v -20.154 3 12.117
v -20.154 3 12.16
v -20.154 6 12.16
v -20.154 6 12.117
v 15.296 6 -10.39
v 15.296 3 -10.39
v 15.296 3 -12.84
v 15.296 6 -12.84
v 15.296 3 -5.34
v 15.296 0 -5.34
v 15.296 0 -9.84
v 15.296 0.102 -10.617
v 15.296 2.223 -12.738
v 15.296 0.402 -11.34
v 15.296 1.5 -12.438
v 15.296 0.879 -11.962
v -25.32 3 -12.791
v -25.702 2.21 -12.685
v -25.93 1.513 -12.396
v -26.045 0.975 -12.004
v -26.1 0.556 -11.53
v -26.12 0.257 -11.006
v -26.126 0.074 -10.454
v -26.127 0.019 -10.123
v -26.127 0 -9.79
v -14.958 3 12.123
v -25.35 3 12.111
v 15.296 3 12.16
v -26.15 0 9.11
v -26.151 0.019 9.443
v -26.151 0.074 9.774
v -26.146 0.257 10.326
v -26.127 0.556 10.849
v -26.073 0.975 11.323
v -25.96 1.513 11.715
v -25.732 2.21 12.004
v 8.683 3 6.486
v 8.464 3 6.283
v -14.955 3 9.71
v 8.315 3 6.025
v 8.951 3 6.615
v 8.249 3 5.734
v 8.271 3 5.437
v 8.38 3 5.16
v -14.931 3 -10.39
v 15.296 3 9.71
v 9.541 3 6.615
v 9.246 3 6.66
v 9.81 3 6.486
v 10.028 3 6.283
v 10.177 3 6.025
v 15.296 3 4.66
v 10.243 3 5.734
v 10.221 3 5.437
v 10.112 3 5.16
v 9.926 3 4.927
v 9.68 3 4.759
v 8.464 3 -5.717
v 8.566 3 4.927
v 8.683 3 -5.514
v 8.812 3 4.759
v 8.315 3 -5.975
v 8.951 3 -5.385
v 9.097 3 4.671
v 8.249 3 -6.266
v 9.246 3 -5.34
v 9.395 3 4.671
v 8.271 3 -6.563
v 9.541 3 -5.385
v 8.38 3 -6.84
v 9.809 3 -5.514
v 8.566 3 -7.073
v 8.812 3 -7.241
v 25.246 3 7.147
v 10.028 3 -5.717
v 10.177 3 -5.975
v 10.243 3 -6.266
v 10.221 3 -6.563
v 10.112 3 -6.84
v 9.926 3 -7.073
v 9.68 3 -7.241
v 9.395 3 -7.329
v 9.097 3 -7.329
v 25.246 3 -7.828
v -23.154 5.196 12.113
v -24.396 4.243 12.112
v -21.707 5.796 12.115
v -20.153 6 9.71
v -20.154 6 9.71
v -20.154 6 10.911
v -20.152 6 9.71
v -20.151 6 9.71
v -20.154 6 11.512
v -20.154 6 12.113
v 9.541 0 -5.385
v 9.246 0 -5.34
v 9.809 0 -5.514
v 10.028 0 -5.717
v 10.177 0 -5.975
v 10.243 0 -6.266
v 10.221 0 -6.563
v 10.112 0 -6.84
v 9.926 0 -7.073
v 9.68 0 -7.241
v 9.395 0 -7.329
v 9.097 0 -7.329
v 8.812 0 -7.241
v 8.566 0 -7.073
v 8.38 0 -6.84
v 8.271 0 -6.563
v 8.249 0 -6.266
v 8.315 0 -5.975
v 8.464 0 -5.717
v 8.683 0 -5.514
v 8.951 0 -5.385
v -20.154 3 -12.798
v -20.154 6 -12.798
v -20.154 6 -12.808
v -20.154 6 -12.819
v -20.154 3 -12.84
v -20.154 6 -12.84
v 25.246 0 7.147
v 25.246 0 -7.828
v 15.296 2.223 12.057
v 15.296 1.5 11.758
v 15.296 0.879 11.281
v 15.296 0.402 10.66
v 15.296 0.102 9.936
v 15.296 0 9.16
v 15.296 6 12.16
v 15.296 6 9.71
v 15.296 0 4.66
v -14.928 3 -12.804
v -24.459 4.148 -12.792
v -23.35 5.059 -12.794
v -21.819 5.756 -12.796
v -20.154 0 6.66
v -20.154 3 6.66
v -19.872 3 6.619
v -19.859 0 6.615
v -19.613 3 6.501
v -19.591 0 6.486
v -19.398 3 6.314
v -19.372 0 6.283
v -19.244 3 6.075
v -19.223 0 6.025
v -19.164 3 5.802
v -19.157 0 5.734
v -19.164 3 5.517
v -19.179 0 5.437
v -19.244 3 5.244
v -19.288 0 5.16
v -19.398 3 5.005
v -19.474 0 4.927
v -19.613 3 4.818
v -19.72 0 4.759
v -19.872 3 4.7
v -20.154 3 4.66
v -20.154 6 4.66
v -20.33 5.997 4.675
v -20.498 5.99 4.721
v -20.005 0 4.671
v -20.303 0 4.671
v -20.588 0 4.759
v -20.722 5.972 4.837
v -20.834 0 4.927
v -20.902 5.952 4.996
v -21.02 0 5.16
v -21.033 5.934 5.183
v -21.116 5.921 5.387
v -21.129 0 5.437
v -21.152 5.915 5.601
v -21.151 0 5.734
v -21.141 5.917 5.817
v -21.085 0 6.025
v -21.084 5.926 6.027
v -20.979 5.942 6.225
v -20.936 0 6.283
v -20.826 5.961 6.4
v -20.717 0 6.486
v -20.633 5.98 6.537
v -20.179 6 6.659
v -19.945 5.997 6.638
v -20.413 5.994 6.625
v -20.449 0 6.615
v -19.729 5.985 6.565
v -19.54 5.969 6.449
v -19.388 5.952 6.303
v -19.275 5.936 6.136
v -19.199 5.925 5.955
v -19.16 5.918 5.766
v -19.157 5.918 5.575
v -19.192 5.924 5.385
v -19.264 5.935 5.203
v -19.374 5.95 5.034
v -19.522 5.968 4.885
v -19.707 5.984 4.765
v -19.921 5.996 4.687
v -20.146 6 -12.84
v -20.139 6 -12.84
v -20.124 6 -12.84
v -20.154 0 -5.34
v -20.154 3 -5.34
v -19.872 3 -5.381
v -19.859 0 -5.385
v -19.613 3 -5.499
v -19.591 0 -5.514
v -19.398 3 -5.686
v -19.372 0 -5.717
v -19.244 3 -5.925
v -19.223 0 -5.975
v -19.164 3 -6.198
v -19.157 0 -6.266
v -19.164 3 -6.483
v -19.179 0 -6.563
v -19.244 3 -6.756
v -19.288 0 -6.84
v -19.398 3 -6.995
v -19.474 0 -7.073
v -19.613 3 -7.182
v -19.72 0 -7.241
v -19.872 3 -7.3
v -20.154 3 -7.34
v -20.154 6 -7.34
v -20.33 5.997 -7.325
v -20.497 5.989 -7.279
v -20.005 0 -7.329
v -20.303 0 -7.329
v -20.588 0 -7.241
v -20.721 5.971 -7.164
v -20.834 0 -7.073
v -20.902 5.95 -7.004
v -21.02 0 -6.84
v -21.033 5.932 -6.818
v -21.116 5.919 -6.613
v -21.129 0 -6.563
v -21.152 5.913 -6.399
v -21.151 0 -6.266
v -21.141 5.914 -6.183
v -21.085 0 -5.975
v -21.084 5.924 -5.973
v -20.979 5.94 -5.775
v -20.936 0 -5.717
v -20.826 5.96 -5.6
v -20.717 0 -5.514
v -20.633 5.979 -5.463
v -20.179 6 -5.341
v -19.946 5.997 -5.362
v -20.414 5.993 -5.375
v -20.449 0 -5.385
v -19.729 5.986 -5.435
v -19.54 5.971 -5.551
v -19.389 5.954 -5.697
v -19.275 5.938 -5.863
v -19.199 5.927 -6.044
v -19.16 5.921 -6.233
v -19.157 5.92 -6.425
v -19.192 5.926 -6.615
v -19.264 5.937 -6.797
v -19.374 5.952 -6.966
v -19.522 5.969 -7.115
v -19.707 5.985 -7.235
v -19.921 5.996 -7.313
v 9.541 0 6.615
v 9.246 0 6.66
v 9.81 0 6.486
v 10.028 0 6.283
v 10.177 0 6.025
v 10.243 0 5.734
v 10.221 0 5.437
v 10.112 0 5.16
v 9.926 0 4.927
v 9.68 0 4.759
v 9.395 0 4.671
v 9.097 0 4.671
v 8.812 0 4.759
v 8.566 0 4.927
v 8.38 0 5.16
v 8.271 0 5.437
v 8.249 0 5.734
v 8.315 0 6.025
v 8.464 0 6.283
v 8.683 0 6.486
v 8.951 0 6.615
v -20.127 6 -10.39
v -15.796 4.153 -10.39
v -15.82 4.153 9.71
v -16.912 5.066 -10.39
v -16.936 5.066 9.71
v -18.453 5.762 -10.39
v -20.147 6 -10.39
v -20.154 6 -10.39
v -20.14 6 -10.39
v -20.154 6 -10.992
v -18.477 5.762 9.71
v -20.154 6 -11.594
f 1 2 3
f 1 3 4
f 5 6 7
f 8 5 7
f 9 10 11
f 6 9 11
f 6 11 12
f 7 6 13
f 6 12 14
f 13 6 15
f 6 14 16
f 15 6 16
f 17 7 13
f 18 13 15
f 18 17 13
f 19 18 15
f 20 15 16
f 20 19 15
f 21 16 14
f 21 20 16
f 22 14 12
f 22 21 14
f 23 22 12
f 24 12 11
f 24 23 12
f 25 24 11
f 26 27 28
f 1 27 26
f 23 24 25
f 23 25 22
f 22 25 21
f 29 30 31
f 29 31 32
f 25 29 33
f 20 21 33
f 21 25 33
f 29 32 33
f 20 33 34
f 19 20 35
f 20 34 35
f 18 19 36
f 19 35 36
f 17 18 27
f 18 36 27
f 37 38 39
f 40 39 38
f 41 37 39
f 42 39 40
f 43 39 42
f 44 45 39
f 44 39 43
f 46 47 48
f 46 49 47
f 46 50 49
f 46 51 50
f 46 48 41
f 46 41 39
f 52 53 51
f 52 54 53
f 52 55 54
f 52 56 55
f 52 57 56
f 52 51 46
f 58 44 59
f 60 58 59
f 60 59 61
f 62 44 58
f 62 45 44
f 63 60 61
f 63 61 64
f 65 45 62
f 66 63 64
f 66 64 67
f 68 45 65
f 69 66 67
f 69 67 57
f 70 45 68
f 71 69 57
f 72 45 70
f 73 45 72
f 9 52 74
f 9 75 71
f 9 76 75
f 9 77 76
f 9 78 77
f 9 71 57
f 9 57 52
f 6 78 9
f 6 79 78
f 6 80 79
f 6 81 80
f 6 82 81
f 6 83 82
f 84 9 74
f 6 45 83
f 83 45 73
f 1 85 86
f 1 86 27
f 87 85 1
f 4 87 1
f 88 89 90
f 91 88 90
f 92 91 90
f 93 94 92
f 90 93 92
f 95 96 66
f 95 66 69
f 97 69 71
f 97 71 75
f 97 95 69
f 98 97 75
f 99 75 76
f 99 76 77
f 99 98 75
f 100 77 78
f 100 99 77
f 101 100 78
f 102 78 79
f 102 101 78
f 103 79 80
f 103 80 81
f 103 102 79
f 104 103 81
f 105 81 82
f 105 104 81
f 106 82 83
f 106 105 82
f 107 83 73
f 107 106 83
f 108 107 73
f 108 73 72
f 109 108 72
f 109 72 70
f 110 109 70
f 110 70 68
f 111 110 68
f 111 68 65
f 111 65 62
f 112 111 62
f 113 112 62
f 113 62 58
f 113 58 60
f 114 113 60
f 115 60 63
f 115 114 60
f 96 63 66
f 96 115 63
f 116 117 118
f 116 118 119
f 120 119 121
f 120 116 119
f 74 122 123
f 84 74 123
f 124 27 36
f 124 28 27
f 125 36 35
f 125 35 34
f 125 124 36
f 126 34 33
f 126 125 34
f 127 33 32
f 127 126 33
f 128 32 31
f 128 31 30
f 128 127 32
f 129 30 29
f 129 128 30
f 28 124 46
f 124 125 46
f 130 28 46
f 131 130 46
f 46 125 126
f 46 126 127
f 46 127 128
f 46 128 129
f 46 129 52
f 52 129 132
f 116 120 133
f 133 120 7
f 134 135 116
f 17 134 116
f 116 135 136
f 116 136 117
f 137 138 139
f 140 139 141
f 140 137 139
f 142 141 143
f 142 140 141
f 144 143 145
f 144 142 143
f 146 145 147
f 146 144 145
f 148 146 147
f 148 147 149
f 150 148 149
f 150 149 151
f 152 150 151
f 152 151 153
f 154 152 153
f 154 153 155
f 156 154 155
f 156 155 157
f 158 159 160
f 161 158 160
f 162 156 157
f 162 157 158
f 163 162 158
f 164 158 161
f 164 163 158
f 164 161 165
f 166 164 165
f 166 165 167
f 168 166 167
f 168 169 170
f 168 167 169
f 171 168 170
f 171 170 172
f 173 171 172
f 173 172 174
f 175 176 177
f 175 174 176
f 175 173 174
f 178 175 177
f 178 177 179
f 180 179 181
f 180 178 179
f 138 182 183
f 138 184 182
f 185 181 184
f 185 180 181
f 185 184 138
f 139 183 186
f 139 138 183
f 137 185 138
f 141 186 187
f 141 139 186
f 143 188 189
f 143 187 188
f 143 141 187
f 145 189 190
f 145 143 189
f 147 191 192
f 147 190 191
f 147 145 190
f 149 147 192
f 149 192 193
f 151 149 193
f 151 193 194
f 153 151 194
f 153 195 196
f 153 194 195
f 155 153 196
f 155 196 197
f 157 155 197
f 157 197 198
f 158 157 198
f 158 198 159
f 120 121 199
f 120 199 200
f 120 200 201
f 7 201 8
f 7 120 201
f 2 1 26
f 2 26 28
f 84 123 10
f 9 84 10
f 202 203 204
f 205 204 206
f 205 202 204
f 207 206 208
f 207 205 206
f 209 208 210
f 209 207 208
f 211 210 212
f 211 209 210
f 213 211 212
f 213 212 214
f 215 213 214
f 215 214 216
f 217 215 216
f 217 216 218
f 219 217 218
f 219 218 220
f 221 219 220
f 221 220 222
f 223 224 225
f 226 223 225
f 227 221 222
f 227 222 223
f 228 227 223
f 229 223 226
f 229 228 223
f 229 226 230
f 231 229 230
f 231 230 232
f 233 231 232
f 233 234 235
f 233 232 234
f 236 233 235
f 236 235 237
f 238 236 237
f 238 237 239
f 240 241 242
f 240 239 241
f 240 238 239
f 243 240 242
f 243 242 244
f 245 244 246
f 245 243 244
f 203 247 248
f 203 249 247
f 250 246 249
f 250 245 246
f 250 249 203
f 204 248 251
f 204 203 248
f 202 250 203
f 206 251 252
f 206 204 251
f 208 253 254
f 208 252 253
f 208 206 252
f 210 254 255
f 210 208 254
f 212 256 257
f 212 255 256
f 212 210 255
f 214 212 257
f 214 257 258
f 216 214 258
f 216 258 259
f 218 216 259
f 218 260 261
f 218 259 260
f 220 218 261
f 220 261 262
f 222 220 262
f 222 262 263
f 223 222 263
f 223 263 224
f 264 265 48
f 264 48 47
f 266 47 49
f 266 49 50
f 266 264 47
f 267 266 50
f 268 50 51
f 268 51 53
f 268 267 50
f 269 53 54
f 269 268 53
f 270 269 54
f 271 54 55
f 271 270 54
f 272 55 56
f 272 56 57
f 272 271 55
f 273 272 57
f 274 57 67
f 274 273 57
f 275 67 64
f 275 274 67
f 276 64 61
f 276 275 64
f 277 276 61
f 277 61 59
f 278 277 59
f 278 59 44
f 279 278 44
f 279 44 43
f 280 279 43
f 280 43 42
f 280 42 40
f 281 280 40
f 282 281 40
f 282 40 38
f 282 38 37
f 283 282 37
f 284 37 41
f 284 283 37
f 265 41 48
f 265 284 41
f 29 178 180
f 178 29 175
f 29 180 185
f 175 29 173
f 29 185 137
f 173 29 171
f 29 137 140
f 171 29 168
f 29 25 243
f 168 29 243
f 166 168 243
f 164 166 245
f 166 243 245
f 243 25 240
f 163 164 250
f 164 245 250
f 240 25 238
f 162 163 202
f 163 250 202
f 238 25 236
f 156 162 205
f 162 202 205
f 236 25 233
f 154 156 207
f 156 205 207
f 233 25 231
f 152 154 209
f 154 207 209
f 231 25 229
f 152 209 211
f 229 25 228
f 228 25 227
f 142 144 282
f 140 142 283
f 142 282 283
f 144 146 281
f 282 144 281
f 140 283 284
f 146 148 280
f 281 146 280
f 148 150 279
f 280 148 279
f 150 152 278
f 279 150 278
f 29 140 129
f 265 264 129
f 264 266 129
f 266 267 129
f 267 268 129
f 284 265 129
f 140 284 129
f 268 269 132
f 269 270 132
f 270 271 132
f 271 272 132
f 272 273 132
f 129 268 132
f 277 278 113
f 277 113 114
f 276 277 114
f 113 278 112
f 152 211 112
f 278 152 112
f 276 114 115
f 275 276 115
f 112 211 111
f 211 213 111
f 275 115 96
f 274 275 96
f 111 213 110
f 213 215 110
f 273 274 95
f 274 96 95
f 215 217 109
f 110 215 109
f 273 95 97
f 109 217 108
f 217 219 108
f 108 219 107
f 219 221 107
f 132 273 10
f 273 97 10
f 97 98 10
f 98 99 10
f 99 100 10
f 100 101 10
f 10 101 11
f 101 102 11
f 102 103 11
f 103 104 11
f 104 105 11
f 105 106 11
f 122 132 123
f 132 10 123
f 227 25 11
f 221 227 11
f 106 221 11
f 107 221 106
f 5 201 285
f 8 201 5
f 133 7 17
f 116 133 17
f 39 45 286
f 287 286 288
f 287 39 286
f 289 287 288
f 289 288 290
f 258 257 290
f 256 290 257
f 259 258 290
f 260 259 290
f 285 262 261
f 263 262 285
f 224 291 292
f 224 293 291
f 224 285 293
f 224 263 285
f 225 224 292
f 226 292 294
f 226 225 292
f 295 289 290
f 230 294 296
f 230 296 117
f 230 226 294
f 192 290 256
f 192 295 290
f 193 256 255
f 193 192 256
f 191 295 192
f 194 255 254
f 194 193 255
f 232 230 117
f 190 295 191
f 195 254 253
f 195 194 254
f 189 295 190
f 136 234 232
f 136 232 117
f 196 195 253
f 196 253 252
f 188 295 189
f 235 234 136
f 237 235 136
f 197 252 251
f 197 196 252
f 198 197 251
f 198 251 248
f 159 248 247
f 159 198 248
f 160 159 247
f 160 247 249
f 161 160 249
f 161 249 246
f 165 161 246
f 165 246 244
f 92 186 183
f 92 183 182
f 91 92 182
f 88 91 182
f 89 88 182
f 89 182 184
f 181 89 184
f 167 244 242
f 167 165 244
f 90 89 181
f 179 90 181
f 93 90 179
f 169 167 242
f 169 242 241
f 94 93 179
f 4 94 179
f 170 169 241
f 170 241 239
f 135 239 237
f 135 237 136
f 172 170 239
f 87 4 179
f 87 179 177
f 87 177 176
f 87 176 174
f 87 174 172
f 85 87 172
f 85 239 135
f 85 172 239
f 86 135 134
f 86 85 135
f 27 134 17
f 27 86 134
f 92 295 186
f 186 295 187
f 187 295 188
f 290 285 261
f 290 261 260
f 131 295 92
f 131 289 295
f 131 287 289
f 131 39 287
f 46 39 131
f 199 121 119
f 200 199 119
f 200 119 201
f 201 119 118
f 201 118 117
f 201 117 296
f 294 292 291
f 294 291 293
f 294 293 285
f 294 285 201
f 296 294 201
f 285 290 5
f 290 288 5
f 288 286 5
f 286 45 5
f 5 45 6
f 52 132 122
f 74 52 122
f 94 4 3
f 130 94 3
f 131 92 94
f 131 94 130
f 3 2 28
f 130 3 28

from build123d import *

# Parameters (mm, degrees)
CROQUIS1_R              = 0.999999899
CROQUIS1_R_2            = 0.999998866
CROQUIS1_R_3            = 1.000000014
CROQUIS1_R_4            = 0.999999985
SALIENTE_EXTRUIR1_DEPTH = 3
SALIENTE_EXTRUIR2_REACH = 38.281
CROQUIS3_W              = 35.45
CROQUIS3_H              = 2.45
SALIENTE_EXTRUIR3_DEPTH = 3
CROQUIS4_R              = 0.999999985
CROQUIS4_R_2            = 1.000000014
CORTAR_EXTRUIR1_DEPTH   = 17
CORTAR_EXTRUIR2_DEPTH   = 31
REDONDEO1_R             = 3


with BuildPart() as part:
    # Croquis1 → Saliente-Extruir1 (new body)
    with BuildSketch(Plane(origin=(0, 0, 0), x_dir=(1, 0, 0), z_dir=(0, 1, 0))):
        Polygon((25.246177886, -7.147133033), (25.246177886, 7.827867349), (15.296177123, 5.340367158), (15.296177123, 12.840367158), (-26.15382364, 12.790366967), (-26.15382364, -12.109632651), (15.296177123, -12.159632842), (15.296177123, -4.659632842), align=None)
        with Locations(Location((9.246177066, 6.34036702, 0), (0, 0, 270))):
            Circle(CROQUIS1_R, mode=Mode.SUBTRACT)
        with Locations(Location((9.246182607, -5.65963638, 0), (0, 0, 270))):
            Circle(CROQUIS1_R_2, mode=Mode.SUBTRACT)
        with Locations(Location((-20.153822905, -5.659632902, 0), (0, 0, 270))):
            Circle(CROQUIS1_R_3, mode=Mode.SUBTRACT)
        with Locations(Location((-20.15382331, 6.340367521, 0), (0, 0, 270))):
            Circle(CROQUIS1_R_4, mode=Mode.SUBTRACT)
    extrude(amount=SALIENTE_EXTRUIR1_DEPTH)

    # Saliente-Extruir2: up to this plane
    saliente_extruir2_end = Plane(origin=(15.296177123, 3, -12.840367158), z_dir=(0.0012062763193973866, 0, 0.999999272448456))
    # Croquis2 → Saliente-Extruir2 (add, up to the surface)
    with BuildSketch(Plane(origin=(-0.014645609, 0, 12.141163746), x_dir=(0.999999272448456, 0, 0.0012062763194219445), z_dir=(-0.0012062763194219447, 0, 0.999999272448456)), mode=Mode.PRIVATE) as saliente_extruir2_sk1:
        with BuildLine():
            Line((-25.335349472, 3), (-14.943044626, 3))
            ThreePointArc((-14.943044626, 3), (-20.139197049, 6), (-25.335349472, 3))
        make_face()
    saliente_extruir2_tool1 = split(extrude(saliente_extruir2_sk1.sketch, amount=-SALIENTE_EXTRUIR2_REACH, mode=Mode.PRIVATE), bisect_by=saliente_extruir2_end, keep=Keep.BOTH, mode=Mode.PRIVATE)
    add(saliente_extruir2_tool1.solids().sort_by_distance((-20.153828, 4.230121, 12.11687))[0])

    # Croquis3 → Saliente-Extruir3 (add)
    with BuildSketch(Plane(origin=(0, 3, 0), x_dir=(1, 0, 0), z_dir=(0, 1, 0))):
        with Locations((-2.428822877, -10.934632842)):
            Rectangle(CROQUIS3_W, CROQUIS3_H)
        with Locations((-2.428822877, 11.615367158)):
            Rectangle(CROQUIS3_W, CROQUIS3_H)
    extrude(amount=SALIENTE_EXTRUIR3_DEPTH)

    # Croquis4 → Cortar-Extruir1 (cut)
    with BuildSketch(Plane.XZ):
        with Locations(Location((-20.15382331, -6.340367521, 0), (0, 0, 270))):
            Circle(CROQUIS4_R)
        with Locations(Location((-20.153822905, 5.659632902, 0), (0, 0, 270))):
            Circle(CROQUIS4_R_2)
    extrude(amount=-CORTAR_EXTRUIR1_DEPTH, mode=Mode.SUBTRACT)

    # Croquis5 → Cortar-Extruir2 (cut)
    with BuildSketch(Plane(origin=(-0.014645609, 0, 12.141163746), x_dir=(0.999999272448456, 0, 0.0012062763194219445), z_dir=(-0.0012062763194219447, 0, 0.999999272448456))):
        with BuildLine():
            Line((-20.139197049, 6), (-20.139197049, 8.549534658))
            ThreePointArc((-20.139197049, 8.549534658), (-26.184630981, 6.045433933), (-28.688731707, 0))
            Line((-28.688731707, 0), (-26.139197049, 0))
            ThreePointArc((-26.139197049, 0), (-24.381837736, 4.242640687), (-20.139197049, 6))
        make_face()
    extrude(amount=-CORTAR_EXTRUIR2_DEPTH, mode=Mode.SUBTRACT)

    # Redondeo1
    redondeo1_edges = [part.edges().sort_by_distance(p)[0] for p in [
        (-5.428823259, 0, 12.134632747),
        (-5.413805086, 0, -12.815385179),
    ]]
    fillet(redondeo1_edges, radius=REDONDEO1_R - 0.0001)  # a hair under: the kernel refuses the full size


solid = part.part
